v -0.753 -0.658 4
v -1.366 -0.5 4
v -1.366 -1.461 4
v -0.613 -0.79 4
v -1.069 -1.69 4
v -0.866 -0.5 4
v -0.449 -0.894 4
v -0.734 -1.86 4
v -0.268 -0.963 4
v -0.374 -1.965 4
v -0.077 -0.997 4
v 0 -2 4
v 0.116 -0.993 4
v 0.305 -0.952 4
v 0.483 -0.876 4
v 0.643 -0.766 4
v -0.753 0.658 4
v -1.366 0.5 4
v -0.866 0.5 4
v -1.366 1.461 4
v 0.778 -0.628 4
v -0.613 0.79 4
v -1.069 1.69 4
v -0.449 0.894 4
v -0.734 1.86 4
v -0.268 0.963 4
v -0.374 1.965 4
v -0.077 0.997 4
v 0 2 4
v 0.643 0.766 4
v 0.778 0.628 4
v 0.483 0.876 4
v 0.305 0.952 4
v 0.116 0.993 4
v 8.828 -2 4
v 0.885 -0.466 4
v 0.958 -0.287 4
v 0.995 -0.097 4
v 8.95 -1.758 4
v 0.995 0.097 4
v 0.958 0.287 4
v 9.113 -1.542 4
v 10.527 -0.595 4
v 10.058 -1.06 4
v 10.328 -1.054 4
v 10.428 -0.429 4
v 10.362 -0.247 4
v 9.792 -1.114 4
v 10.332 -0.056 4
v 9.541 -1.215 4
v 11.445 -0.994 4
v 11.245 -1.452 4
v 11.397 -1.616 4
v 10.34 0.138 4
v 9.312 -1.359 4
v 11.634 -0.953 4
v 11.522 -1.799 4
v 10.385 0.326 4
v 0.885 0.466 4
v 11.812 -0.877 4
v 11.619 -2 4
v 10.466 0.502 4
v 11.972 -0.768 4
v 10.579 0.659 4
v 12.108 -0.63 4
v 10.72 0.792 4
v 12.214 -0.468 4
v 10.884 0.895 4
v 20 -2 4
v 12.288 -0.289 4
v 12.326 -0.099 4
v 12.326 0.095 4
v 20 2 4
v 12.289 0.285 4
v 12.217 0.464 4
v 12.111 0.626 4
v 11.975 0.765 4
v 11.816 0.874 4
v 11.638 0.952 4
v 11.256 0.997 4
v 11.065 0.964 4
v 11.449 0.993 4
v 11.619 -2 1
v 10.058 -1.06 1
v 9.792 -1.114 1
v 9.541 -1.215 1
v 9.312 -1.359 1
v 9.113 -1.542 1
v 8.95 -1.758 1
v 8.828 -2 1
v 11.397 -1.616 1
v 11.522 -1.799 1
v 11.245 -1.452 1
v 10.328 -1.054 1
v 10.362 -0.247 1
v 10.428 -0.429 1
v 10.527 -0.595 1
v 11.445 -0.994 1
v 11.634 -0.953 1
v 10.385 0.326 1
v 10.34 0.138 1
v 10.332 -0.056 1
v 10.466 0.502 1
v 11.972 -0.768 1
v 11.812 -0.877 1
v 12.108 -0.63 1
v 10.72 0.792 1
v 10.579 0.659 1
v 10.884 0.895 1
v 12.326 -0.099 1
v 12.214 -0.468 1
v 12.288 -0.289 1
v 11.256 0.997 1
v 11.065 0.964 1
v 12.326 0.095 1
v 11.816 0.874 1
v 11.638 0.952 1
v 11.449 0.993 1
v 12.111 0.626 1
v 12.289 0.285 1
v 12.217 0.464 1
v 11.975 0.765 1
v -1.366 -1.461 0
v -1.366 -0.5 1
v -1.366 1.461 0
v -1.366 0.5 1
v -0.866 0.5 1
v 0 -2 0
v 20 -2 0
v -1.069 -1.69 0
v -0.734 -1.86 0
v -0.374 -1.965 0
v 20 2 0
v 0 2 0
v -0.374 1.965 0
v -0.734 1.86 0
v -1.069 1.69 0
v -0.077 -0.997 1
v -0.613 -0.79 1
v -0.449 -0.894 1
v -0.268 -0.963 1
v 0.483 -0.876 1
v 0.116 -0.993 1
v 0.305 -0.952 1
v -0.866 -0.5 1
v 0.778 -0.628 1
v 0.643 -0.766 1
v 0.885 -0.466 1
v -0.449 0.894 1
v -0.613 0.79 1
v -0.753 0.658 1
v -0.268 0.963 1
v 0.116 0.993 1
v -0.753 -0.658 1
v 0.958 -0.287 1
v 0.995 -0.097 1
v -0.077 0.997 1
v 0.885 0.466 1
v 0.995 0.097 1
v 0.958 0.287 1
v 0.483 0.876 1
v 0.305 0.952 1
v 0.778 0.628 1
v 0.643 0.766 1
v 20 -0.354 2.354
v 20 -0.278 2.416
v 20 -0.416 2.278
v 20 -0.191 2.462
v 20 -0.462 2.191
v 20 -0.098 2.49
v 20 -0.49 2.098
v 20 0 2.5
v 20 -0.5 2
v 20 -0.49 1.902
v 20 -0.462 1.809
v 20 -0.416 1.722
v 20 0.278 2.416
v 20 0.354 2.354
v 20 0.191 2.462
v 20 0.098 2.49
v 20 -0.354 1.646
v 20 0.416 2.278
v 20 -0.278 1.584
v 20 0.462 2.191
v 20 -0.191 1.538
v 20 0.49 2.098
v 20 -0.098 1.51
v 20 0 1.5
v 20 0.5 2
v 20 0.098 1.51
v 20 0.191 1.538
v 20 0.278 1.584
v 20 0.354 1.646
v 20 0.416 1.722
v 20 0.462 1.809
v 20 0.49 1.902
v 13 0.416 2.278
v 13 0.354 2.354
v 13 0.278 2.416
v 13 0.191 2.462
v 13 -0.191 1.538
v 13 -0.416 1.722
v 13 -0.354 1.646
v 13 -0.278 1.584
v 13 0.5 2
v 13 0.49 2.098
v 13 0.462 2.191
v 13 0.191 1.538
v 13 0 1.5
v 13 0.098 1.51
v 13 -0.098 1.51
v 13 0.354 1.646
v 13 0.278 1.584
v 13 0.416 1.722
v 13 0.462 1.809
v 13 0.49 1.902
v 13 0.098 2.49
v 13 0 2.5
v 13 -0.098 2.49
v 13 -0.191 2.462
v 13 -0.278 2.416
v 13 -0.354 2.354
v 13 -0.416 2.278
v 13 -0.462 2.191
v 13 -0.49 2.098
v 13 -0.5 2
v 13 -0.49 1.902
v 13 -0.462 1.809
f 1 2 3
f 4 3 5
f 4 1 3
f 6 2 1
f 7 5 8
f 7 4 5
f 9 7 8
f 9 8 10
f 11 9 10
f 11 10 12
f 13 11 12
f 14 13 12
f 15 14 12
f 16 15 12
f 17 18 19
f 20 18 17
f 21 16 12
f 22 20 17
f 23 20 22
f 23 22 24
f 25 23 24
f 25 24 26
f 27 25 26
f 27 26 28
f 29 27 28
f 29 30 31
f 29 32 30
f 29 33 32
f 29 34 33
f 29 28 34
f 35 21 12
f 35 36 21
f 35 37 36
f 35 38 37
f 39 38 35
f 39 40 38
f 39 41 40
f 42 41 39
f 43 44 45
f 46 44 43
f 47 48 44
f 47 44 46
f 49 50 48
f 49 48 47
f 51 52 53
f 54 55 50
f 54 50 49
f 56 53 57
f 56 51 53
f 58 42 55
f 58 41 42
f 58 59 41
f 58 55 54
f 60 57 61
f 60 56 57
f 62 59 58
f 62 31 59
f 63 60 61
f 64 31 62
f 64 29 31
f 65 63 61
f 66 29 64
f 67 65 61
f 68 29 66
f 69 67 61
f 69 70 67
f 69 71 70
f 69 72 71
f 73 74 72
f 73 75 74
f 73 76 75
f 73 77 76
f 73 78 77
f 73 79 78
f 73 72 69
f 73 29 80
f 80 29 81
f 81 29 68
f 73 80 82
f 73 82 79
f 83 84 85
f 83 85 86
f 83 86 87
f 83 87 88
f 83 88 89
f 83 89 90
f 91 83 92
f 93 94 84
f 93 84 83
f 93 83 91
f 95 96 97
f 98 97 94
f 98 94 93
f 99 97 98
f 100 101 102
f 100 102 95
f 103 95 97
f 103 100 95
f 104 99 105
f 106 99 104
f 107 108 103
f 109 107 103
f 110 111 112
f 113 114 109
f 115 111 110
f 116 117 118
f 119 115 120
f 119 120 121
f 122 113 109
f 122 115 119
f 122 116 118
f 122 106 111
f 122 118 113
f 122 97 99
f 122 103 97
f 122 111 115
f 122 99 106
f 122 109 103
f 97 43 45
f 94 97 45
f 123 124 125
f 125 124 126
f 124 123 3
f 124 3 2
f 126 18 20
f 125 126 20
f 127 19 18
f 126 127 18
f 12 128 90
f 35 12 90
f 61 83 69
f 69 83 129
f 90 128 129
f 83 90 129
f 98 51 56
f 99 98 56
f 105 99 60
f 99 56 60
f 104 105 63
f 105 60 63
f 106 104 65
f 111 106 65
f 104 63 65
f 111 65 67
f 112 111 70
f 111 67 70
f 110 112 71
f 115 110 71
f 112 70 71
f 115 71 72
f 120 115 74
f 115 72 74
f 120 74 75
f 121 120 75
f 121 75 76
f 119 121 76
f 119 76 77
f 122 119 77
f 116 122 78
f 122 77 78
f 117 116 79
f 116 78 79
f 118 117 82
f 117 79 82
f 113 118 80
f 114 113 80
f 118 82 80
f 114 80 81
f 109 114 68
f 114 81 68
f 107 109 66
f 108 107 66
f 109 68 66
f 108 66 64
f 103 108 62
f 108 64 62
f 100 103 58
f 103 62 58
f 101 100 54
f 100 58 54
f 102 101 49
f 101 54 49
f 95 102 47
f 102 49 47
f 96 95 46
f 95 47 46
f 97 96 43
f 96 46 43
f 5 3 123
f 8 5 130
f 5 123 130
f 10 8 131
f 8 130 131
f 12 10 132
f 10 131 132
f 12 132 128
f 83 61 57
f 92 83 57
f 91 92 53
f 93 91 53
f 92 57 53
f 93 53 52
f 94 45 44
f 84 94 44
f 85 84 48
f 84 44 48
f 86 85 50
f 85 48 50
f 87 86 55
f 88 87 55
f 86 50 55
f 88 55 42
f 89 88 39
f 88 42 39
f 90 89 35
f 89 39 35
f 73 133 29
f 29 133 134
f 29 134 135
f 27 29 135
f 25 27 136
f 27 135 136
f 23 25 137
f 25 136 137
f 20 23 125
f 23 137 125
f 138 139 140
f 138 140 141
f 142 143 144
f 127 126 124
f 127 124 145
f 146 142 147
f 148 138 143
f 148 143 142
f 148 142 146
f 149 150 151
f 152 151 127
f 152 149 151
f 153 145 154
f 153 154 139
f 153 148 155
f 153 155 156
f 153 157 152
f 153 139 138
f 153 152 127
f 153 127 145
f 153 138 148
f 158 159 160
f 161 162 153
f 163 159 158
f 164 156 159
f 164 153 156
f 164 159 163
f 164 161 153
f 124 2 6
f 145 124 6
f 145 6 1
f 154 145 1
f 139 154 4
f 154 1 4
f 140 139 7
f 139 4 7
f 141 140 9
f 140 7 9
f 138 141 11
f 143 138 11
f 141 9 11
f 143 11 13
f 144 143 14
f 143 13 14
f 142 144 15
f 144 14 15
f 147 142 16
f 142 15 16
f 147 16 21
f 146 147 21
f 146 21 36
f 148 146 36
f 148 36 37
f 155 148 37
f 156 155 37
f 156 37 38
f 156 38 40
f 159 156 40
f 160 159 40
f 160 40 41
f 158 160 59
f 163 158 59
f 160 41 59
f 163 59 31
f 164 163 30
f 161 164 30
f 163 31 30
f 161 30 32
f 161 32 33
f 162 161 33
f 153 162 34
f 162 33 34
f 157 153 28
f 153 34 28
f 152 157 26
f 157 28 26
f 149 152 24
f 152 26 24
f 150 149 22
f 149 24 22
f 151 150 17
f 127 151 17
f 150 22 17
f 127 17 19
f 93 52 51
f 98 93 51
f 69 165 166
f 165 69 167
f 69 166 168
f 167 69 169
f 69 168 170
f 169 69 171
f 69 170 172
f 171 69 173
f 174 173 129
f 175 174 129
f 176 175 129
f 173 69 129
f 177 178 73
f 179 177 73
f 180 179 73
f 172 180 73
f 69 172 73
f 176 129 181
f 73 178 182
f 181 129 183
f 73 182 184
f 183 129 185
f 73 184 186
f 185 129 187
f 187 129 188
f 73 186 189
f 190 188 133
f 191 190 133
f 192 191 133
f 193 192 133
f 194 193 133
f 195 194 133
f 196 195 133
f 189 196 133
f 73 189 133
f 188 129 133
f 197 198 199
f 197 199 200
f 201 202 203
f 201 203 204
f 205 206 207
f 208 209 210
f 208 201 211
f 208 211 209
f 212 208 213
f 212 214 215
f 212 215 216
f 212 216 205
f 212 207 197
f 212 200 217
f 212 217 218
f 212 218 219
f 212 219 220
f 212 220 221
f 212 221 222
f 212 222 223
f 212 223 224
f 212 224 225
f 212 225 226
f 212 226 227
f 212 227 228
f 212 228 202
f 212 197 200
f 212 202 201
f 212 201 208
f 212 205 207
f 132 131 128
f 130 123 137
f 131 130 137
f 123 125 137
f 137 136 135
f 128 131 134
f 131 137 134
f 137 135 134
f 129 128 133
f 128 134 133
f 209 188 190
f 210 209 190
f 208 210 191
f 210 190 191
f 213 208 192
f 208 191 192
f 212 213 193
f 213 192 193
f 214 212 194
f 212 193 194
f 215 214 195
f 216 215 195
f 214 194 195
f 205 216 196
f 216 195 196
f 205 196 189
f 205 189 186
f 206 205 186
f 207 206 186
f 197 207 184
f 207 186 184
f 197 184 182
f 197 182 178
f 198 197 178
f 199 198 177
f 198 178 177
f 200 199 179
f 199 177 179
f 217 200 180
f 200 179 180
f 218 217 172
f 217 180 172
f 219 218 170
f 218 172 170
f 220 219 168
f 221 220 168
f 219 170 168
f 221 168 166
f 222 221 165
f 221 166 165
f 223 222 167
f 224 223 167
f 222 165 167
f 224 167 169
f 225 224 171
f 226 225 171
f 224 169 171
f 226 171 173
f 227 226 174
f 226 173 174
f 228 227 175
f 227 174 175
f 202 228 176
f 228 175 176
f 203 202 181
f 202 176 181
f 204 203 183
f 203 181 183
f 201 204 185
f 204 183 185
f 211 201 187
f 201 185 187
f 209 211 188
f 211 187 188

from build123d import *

# Parameters (mm, degrees)
EXTRUDE_1_DEPTH     = 4
SKETCH_4_R          = 0.5
CUT_EXTRUDE_1_DEPTH = 7
CUT_EXTRUDE_4_DEPTH = 3
CUT_EXTRUDE_5_DEPTH = 3
CUT_EXTRUDE_6_DEPTH = 3


with BuildPart() as part:
    # 草图3 → 凸台-拉伸1 (new body)
    with BuildSketch(Plane.XY):
        with BuildLine():
            Line((0, -2), (20, -2))
            Line((20, -2), (20, 2))
            Line((20, 2), (0, 2))
            ThreePointArc((0, 2), (-2, 0), (0, -2))
        make_face()
    extrude(amount=EXTRUDE_1_DEPTH)

    # 草图4 → 切除-拉伸1 (cut)
    with BuildSketch(Plane(origin=(20, 0, 0), x_dir=(0, 0, -1), z_dir=(1, 0, 0))):
        with Locations((-2, 0)):
            Circle(SKETCH_4_R)
    extrude(amount=-CUT_EXTRUDE_1_DEPTH, mode=Mode.SUBTRACT)

    # 草图5 → 切除-拉伸4 (cut)
    with BuildSketch(Plane.XY.offset(4)):
        with BuildLine():
            Line((-0.866025404, 0.5), (-1.366025404, 0.5))
            Line((-1.366025404, 0.5), (-1.366025404, 1.460812992))
            ThreePointArc((-1.366025404, 1.460812992), (-2, 0), (-1.366025404, -1.460812992))
            Line((-1.366025404, -1.460812992), (-1.366025404, -0.5))
            Line((-1.366025404, -0.5), (-0.866025404, -0.5))
            ThreePointArc((-0.866025404, -0.5), (1, 0), (-0.866025404, 0.5))
        make_face()
    extrude(amount=-CUT_EXTRUDE_4_DEPTH, mode=Mode.SUBTRACT)

    # 草图6 → 切除-拉伸5 (cut)
    with BuildSketch(Plane.XY.offset(1)):
        with BuildLine():
            Line((-1.366025404, 0.5), (-1.366025404, -0.5))
            Line((-1.366025404, -0.5), (-1.366025404, -1.460812992))
            ThreePointArc((-1.366025404, -1.460812992), (-2, 0), (-1.366025404, 1.460812992))
            Line((-1.366025404, 1.460812992), (-1.366025404, 0.5))
        make_face()
    extrude(amount=-CUT_EXTRUDE_5_DEPTH, mode=Mode.SUBTRACT)

    # 草图7 → 切除-拉伸6 (cut)
    with BuildSketch(Plane.XY.offset(4)):
        with BuildLine():
            Line((10.527261775, -0.595306745), (10.328163394, -1.053956758))
            ThreePointArc((10.328163394, -1.053956758), (9.423448211, -1.281600523), (8.828273079, -2))
            Line((8.828273079, -2), (9.917489301, -2))
            Line((9.917489301, -2), (11.007645162, -2))
            Line((11.007645162, -2), (11.619083211, -2))
            ThreePointArc((11.619083211, -2), (11.462926396, -1.705172003), (11.24546342, -1.45215352))
            Line((11.24546342, -1.45215352), (11.444561801, -0.993503507))
            ThreePointArc((11.444561801, -0.993503507), (11.728957062, 0.917300026), (10.527261775, -0.595306745))
        make_face()
    extrude(amount=-CUT_EXTRUDE_6_DEPTH, mode=Mode.SUBTRACT)


solid = part.part
